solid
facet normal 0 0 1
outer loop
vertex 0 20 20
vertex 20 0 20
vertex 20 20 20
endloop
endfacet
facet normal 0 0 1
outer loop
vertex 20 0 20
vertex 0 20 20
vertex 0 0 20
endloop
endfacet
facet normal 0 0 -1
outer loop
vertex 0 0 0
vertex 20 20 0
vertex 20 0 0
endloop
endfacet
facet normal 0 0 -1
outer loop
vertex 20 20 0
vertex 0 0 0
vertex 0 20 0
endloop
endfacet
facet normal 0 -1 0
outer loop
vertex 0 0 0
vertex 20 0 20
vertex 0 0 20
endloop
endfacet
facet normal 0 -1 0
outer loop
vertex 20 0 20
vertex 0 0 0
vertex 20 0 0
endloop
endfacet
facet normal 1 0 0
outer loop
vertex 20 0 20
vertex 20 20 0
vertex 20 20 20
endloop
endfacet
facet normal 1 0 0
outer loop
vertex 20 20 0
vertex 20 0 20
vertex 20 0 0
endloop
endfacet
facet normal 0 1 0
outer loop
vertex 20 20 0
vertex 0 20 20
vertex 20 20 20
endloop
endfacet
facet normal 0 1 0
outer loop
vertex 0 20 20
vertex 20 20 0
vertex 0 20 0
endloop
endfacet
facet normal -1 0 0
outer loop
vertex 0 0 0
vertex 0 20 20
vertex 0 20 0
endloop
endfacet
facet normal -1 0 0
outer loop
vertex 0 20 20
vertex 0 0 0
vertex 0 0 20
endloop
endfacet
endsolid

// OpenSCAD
/* [Hidden] */

// onescad: main.scad

width = 20;

module m() { cube(width); }

m();
